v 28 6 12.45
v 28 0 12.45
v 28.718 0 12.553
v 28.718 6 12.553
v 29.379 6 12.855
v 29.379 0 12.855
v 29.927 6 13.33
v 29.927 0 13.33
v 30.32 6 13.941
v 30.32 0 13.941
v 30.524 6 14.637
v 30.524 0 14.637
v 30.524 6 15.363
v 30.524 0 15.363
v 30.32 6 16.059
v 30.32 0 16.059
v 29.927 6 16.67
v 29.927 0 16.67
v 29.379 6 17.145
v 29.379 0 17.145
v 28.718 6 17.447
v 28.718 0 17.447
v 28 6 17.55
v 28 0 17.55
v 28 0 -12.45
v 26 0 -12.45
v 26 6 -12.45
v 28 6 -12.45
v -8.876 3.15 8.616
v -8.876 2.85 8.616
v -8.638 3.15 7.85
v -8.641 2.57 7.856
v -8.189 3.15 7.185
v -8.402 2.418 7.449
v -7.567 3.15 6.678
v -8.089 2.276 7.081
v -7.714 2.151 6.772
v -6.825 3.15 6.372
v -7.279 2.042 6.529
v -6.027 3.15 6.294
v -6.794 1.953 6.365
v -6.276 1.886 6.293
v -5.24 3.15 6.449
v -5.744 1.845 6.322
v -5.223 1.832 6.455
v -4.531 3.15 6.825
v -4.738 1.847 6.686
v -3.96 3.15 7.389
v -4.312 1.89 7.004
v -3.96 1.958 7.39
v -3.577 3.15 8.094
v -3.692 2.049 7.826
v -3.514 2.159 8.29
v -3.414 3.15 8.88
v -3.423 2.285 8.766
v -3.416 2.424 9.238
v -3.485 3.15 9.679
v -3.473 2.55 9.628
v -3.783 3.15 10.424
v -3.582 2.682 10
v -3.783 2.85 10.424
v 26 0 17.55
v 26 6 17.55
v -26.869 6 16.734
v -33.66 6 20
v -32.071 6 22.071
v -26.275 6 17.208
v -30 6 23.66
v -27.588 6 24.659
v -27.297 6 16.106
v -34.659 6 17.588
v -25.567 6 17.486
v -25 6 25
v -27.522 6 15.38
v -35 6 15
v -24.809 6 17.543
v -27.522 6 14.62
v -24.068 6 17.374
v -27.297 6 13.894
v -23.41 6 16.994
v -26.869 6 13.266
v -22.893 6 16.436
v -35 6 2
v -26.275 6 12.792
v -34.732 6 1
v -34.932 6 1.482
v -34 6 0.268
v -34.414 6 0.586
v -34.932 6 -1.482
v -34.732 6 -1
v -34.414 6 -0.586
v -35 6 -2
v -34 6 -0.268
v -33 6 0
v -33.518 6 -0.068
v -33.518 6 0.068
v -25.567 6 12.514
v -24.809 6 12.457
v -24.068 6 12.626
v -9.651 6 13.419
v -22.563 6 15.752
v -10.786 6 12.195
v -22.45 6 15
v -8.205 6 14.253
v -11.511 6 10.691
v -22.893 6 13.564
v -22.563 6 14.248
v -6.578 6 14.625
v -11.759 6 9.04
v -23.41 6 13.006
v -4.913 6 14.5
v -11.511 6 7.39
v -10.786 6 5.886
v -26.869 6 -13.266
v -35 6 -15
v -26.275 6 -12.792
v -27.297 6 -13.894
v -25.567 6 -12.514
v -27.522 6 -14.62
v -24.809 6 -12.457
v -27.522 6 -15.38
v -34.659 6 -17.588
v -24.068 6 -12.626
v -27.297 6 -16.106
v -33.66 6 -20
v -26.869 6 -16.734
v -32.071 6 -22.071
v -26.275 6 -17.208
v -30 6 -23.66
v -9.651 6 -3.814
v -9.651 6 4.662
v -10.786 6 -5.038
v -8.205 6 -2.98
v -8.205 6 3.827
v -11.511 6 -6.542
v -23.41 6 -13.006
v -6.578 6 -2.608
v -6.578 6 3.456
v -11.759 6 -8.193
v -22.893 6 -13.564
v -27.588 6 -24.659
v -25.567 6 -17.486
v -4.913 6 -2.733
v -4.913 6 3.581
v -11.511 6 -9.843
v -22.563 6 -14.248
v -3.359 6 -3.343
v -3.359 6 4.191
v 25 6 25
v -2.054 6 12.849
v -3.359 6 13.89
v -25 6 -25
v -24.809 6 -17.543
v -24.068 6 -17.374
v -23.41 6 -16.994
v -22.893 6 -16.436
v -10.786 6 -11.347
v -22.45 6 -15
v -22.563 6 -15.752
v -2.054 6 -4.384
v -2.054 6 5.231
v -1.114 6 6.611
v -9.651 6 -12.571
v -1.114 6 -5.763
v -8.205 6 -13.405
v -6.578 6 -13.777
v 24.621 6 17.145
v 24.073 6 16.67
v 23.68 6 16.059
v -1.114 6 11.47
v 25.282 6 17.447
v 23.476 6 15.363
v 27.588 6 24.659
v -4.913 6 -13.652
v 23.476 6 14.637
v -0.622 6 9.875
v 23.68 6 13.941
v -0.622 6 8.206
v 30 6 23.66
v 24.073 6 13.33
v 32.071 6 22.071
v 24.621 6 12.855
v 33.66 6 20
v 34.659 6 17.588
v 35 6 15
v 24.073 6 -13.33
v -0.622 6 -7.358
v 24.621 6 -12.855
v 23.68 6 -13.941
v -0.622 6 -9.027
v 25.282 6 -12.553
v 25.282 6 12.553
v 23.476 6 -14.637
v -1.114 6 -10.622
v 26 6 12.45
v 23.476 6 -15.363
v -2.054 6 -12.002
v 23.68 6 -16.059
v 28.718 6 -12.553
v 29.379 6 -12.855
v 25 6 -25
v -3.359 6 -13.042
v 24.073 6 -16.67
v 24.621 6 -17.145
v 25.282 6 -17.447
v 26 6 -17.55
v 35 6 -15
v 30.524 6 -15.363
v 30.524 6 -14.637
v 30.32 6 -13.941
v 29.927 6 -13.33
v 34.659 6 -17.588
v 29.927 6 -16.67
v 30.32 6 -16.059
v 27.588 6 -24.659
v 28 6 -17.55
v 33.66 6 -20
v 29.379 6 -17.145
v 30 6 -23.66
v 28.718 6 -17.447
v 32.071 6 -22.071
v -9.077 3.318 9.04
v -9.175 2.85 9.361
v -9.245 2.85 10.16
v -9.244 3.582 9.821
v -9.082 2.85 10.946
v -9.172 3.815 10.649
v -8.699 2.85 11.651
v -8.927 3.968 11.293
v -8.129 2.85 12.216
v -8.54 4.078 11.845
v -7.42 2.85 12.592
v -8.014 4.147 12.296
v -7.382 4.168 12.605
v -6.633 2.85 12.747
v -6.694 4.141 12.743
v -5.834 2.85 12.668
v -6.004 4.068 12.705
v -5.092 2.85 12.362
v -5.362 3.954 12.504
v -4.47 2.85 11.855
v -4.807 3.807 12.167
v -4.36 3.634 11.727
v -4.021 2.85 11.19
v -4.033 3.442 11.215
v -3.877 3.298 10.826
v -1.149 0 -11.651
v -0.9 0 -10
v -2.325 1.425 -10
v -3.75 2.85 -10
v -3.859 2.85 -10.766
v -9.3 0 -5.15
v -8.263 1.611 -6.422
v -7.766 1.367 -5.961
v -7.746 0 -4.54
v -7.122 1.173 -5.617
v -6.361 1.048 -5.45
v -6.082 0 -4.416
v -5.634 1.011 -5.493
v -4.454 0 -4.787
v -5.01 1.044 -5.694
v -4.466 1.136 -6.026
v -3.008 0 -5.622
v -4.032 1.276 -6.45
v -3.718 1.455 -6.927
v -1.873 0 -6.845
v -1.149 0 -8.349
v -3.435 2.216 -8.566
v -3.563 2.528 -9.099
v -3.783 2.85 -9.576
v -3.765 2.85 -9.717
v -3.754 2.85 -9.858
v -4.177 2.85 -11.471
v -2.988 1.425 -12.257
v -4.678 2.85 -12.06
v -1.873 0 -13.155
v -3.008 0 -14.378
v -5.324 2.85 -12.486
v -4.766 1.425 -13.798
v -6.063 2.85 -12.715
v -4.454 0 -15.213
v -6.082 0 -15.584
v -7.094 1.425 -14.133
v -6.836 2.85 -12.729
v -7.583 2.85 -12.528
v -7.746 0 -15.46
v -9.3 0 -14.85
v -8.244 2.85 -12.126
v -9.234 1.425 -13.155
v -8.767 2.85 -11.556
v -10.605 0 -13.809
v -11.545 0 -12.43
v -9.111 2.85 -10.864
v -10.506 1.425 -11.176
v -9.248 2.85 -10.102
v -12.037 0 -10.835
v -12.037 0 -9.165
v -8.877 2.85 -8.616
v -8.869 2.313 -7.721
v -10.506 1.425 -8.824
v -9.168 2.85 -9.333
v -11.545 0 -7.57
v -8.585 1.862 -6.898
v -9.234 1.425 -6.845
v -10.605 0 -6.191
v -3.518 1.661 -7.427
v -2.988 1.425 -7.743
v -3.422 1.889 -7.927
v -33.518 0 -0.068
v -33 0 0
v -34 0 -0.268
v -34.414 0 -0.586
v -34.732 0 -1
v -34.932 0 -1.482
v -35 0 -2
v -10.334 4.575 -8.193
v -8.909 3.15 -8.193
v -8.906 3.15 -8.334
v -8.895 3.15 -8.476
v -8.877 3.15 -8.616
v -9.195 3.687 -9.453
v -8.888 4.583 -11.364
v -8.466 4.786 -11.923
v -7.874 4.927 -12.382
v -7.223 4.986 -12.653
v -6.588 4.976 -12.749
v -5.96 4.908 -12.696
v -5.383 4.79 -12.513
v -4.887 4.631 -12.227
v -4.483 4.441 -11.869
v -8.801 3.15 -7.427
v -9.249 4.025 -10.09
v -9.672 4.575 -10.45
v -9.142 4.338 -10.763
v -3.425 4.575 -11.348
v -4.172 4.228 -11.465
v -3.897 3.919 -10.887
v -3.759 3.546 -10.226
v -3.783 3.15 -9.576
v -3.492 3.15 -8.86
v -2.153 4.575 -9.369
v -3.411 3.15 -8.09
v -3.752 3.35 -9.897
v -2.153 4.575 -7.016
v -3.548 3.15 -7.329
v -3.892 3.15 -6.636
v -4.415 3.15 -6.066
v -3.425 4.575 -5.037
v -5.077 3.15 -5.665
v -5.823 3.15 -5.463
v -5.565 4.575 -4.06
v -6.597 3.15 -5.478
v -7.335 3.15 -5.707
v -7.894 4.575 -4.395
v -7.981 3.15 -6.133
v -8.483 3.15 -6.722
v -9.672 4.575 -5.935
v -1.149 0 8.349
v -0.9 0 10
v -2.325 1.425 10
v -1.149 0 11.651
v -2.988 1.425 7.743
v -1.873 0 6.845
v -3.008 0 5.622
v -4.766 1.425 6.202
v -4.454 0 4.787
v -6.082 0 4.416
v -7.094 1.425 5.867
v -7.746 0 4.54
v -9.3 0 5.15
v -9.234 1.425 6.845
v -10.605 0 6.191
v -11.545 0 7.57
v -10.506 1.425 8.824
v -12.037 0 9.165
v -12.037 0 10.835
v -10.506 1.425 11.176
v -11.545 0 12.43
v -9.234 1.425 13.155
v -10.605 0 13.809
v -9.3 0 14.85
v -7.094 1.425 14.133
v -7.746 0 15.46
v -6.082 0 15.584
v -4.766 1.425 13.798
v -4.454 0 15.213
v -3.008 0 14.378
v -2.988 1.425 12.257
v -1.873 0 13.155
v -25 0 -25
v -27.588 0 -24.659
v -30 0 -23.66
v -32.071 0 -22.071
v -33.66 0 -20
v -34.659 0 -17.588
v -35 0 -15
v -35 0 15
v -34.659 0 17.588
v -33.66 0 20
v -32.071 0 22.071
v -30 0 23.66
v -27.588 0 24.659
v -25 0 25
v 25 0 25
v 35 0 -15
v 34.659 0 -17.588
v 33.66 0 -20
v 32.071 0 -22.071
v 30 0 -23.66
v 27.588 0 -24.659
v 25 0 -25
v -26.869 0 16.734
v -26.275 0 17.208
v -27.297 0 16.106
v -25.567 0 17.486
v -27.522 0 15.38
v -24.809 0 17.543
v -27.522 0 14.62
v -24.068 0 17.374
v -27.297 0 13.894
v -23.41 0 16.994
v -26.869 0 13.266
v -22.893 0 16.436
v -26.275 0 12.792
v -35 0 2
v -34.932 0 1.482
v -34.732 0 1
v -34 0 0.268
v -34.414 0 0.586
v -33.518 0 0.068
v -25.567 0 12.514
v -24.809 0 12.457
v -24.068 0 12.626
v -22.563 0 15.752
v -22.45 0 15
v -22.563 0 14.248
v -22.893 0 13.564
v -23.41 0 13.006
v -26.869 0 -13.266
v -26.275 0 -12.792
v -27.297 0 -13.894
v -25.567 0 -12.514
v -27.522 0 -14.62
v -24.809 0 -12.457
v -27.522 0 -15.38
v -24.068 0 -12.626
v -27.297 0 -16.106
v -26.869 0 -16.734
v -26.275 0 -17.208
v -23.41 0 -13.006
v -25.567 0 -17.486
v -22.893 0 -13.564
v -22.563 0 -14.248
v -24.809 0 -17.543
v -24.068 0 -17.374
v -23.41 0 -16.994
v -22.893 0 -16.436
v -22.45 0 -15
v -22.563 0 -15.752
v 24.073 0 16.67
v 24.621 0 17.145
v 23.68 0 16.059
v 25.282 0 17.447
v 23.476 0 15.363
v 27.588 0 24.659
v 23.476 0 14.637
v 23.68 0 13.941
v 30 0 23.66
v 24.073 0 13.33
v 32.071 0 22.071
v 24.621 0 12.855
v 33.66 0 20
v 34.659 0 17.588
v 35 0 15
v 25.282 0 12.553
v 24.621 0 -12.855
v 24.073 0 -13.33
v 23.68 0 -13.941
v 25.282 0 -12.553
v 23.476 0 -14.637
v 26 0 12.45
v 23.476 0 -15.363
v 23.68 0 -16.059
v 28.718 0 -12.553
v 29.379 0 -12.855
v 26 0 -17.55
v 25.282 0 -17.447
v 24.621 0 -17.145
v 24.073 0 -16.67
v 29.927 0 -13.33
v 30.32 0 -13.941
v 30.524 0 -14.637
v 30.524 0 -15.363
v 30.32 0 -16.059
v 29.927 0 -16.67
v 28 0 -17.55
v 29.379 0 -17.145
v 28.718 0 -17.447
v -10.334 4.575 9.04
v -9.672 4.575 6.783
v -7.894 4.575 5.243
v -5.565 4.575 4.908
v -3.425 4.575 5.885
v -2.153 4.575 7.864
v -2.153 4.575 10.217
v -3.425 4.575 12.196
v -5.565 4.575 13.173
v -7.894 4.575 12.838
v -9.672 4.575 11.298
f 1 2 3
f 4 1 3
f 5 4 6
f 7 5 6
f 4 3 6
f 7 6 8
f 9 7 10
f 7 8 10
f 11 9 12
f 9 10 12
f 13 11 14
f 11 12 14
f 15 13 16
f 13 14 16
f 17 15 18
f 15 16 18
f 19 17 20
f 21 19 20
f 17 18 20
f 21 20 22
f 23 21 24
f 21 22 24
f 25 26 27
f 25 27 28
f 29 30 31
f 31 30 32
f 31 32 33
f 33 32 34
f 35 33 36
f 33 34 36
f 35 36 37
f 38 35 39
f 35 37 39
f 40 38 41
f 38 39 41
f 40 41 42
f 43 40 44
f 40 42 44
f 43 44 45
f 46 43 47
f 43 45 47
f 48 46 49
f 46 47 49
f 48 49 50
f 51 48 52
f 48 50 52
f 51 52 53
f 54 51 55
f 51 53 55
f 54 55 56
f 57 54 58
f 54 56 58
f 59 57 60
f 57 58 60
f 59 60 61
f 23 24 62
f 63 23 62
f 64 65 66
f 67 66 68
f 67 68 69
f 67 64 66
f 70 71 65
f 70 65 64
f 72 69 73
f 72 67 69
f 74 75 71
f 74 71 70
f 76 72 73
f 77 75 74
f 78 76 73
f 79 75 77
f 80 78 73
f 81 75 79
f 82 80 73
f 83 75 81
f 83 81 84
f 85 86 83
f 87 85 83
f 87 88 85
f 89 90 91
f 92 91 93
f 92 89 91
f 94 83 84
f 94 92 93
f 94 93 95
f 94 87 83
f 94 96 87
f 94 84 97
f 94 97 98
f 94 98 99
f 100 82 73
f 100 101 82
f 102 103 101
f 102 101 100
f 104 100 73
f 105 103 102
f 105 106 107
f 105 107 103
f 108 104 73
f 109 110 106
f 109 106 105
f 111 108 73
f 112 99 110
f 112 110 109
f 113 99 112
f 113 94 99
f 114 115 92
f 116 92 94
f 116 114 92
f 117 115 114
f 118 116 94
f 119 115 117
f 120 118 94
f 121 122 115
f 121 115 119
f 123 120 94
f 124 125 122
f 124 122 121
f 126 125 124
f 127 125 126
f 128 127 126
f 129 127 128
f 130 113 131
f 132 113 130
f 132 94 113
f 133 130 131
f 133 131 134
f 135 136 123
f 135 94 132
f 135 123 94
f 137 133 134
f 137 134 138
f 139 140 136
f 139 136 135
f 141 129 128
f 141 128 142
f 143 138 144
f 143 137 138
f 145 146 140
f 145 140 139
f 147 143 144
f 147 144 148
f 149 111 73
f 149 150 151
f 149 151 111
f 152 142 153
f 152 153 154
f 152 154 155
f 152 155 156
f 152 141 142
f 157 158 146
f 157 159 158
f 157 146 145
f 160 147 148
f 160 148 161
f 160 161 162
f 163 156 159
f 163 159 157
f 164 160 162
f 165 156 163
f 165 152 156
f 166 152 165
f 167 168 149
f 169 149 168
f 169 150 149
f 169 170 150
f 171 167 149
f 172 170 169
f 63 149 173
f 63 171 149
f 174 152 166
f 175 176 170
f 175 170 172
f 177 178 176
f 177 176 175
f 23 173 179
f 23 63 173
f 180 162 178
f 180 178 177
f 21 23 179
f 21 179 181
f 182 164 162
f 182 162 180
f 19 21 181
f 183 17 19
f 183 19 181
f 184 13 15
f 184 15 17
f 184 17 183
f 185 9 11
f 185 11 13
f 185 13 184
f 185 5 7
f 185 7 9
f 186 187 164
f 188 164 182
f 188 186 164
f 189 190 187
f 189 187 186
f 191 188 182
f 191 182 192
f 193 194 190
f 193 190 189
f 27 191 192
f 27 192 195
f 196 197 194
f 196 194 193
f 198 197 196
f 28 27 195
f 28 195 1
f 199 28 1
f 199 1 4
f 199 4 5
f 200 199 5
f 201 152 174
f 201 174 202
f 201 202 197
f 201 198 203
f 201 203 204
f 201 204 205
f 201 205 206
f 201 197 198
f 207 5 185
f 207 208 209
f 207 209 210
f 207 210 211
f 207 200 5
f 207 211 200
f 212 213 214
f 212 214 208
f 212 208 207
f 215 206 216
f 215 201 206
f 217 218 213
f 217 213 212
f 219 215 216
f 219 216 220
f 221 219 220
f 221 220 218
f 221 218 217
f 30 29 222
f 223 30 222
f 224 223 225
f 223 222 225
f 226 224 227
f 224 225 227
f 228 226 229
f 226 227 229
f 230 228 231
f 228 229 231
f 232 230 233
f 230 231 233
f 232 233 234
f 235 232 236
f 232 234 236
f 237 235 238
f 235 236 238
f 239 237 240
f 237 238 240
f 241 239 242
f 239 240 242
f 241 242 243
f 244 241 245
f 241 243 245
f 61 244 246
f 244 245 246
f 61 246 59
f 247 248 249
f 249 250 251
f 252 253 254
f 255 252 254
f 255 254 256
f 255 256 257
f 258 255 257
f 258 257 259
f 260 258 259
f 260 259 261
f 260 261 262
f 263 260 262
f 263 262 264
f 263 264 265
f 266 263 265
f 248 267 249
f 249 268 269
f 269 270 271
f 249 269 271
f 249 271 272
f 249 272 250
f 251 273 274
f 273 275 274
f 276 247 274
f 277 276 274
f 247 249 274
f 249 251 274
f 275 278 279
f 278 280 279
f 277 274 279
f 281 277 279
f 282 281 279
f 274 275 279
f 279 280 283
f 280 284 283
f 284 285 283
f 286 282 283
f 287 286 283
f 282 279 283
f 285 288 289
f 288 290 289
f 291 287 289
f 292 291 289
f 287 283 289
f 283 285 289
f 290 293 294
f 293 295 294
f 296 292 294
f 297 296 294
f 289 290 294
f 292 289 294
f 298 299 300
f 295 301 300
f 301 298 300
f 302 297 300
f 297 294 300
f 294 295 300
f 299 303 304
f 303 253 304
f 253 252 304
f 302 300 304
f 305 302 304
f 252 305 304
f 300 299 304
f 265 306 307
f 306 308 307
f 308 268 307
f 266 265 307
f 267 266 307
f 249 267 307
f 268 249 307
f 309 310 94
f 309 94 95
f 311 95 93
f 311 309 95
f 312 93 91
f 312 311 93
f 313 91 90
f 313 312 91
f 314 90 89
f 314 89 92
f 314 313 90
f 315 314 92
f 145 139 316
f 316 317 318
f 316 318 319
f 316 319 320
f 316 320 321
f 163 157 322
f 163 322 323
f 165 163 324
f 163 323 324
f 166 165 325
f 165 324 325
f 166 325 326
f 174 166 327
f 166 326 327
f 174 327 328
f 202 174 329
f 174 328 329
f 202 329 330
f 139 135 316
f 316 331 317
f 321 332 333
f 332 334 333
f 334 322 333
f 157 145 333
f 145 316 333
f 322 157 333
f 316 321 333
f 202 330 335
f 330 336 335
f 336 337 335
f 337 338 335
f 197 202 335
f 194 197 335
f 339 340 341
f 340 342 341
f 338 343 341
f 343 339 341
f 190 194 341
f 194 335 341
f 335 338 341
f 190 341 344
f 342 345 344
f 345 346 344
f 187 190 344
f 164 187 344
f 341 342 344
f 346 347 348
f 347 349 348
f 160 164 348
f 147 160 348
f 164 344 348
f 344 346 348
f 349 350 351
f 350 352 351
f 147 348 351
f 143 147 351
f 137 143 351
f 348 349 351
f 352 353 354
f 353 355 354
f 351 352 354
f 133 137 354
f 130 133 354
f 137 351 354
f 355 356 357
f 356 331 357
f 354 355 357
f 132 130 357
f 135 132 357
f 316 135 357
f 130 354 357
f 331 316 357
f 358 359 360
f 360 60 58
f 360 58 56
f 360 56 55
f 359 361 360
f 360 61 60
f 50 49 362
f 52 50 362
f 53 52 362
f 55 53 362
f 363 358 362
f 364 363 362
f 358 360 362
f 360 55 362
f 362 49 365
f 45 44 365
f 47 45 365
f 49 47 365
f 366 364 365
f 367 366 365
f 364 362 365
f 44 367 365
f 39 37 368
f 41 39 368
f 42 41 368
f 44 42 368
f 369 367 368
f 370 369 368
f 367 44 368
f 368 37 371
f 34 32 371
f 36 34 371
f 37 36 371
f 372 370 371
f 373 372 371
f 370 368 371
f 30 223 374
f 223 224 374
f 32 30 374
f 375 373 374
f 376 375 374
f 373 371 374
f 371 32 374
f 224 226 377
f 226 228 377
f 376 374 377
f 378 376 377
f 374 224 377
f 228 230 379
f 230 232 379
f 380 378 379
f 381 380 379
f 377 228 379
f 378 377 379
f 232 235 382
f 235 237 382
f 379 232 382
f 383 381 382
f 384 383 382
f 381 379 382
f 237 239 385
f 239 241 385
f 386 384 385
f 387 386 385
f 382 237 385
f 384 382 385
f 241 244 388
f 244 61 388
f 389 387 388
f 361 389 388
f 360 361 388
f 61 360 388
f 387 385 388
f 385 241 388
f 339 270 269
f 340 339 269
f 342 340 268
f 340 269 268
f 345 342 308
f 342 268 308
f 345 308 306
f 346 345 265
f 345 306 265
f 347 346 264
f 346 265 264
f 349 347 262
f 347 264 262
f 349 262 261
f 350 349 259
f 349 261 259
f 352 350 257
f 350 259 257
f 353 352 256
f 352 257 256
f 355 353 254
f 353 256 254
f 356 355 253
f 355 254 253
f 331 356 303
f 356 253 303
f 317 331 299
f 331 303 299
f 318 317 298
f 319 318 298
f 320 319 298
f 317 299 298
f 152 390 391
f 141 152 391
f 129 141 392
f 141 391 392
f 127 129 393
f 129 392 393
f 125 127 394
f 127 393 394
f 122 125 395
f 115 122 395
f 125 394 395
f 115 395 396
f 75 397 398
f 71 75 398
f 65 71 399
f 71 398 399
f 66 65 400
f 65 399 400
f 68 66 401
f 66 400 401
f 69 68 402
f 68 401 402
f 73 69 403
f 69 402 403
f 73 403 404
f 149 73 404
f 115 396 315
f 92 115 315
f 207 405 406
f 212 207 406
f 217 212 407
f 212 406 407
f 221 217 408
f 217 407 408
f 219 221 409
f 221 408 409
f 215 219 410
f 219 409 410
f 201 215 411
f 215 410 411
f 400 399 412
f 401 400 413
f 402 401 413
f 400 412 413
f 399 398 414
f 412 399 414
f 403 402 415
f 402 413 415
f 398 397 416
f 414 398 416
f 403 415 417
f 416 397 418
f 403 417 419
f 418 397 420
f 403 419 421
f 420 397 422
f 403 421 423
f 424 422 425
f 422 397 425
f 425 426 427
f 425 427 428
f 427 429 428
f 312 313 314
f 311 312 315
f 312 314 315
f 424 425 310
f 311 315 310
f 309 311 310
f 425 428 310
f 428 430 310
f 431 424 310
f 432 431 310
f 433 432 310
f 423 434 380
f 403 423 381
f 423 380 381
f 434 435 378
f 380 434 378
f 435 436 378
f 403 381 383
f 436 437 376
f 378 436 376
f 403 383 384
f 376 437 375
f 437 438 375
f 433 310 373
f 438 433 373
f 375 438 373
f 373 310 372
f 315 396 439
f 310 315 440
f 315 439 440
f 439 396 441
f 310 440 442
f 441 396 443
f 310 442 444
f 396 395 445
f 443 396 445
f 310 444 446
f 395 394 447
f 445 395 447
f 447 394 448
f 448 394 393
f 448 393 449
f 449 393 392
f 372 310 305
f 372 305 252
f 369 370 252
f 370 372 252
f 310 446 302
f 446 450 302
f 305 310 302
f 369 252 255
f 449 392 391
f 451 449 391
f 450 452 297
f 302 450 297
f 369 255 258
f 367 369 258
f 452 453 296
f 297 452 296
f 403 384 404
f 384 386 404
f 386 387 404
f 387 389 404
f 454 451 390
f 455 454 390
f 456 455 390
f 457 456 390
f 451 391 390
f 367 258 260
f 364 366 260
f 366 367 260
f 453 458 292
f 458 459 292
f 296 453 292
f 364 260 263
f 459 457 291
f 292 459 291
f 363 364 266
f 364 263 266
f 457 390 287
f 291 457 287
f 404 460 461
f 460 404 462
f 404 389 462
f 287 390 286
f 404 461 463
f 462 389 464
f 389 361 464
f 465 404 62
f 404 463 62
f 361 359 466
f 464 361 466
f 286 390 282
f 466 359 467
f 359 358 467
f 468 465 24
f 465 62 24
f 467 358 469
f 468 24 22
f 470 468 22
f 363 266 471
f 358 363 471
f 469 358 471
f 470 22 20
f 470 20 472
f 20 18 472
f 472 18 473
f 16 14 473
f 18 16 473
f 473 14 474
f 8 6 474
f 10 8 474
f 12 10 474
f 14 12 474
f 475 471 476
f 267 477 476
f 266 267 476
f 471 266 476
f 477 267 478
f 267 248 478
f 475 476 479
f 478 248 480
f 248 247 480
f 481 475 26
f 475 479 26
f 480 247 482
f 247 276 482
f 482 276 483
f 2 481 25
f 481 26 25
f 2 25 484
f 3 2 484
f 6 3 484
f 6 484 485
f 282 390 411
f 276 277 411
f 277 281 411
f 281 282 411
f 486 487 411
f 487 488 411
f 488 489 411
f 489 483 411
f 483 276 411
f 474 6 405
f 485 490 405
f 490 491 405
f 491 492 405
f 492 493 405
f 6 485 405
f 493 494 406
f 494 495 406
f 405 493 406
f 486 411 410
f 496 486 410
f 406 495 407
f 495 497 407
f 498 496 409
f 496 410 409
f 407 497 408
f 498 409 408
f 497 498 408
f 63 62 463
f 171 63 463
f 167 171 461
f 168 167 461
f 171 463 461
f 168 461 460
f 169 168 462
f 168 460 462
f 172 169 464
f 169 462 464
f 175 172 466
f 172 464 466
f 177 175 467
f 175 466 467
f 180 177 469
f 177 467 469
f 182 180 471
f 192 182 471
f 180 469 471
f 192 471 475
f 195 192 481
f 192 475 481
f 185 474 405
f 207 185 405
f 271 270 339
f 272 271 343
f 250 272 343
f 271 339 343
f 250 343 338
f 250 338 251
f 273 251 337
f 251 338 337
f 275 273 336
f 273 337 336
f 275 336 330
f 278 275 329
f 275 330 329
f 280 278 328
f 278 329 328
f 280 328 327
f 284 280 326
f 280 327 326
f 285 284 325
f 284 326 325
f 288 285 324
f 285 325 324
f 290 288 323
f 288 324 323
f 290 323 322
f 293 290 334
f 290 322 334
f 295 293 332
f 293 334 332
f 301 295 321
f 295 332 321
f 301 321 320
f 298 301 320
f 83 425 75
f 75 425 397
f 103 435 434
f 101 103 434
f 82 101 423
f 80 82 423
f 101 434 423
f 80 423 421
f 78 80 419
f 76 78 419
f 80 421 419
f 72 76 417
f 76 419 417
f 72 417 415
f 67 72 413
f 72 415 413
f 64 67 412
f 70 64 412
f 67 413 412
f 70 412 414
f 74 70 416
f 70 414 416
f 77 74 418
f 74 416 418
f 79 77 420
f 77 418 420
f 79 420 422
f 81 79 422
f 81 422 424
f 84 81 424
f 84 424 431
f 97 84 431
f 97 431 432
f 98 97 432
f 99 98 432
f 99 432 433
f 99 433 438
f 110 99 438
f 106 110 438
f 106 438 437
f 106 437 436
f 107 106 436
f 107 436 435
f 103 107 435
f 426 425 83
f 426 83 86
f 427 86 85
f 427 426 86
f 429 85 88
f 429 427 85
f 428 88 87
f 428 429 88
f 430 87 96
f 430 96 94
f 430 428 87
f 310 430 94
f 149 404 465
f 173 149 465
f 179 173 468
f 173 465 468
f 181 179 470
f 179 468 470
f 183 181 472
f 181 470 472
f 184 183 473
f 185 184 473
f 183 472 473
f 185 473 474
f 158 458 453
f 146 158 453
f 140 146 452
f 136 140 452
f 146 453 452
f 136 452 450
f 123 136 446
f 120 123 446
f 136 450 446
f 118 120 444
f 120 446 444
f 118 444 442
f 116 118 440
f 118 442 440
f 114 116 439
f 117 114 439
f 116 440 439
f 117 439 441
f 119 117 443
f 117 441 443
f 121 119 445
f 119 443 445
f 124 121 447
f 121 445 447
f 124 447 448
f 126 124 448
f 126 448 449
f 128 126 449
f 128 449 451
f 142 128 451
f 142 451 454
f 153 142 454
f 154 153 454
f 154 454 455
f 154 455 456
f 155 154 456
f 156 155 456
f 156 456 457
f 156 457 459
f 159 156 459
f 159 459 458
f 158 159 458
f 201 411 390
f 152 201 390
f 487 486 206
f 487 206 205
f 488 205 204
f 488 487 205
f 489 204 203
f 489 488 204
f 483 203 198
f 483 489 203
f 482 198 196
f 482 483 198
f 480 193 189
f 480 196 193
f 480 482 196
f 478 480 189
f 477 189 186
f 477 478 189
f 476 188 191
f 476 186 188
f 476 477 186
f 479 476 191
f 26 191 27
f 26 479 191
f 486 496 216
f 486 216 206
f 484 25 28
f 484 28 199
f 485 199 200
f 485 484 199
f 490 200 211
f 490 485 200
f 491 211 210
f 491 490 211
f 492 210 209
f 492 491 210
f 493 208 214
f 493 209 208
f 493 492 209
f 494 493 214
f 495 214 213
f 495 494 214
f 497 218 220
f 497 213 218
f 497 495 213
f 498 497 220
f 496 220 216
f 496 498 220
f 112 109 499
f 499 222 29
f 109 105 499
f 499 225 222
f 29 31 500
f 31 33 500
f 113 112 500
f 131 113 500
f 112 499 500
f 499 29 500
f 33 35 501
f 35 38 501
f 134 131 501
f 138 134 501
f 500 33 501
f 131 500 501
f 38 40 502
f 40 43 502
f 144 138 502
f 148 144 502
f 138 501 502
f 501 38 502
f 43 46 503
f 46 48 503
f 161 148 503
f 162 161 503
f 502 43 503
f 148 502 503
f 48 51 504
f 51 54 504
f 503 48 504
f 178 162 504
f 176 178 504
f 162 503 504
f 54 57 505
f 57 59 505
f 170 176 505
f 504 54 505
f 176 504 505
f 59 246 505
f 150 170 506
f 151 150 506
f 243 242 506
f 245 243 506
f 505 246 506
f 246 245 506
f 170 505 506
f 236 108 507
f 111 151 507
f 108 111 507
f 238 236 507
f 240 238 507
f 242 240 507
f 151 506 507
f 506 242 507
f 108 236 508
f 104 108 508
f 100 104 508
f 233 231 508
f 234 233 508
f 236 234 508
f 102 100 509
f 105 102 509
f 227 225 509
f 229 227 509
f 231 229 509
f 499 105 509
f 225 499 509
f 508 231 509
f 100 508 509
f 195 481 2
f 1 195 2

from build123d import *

# Parameters (mm, degrees)
EXTRUDE_1_DEPTH             = 6
SKETCH_2_R                  = 2.55
CUT_EXTRUDE_1_DEPTH         = 7
CUT_EXTRUDE_2_DEPTH         = 7
HOLE_WIZARD_M52_D           = 5.5
HOLE_WIZARD_M52_CSINK_D     = 11.2
HOLE_WIZARD_M52_CSINK_ANGLE = 90
HOLE_WIZARD_M51_D           = 5.5
HOLE_WIZARD_M51_CSINK_D     = 11.2
HOLE_WIZARD_M51_CSINK_ANGLE = 90


with BuildPart() as part:
    # Эскиз1 → Бобышка-Вытянуть1 (new body)
    with BuildSketch(Plane(origin=(0, 0, 0), x_dir=(1, 0, 0), z_dir=(0, 1, 0))):
        with BuildLine():
            Line((-25, -25), (25, -25))
            ThreePointArc((25, -25), (32.071067812, -22.071067812), (35, -15))
            Line((35, -15), (35, 15))
            ThreePointArc((35, 15), (32.071067812, 22.071067812), (25, 25))
            Line((25, 25), (-25, 25))
            ThreePointArc((-25, 25), (-32.071067812, 22.071067812), (-35, 15))
            Line((-35, 15), (-35, -15))
            ThreePointArc((-35, -15), (-32.071067812, -22.071067812), (-25, -25))
        make_face()
    extrude(amount=EXTRUDE_1_DEPTH)

    # Эскиз2 → Вырез-Вытянуть1 (cut, through all)
    with BuildSketch(Plane.XZ):
        with Locations((-25, -15)):
            Circle(SKETCH_2_R)
        with Locations((-25, 15)):
            Circle(SKETCH_2_R)
        with BuildLine():
            Line((28, -17.55), (26, -17.55))
            ThreePointArc((26, -17.55), (23.45, -15), (26, -12.45))
            Line((26, -12.45), (28, -12.45))
            ThreePointArc((28, -12.45), (30.55, -15), (28, -17.55))
        make_face()
        with BuildLine():
            Line((28, 17.55), (26, 17.55))
            ThreePointArc((26, 17.55), (23.45, 15), (26, 12.45))
            Line((26, 12.45), (28, 12.45))
            ThreePointArc((28, 12.45), (30.55, 15), (28, 17.55))
        make_face()
    extrude(amount=-CUT_EXTRUDE_1_DEPTH, mode=Mode.SUBTRACT)

    # Эскиз3 → Вырез-Вытянуть2 (cut, through all)
    with BuildSketch(Plane.XZ):
        with BuildLine():
            Line((-35, -2), (-35, 2))
            ThreePointArc((-35, 2), (-34.414213562, 0.585786438), (-33, 0))
            ThreePointArc((-33, 0), (-34.414213562, -0.585786438), (-35, -2))
        make_face()
    extrude(amount=-CUT_EXTRUDE_2_DEPTH, mode=Mode.SUBTRACT)

    # Зенковка для  винта с потайной головкой с внутренним шестигранником M52 (through all)
    with Locations(Plane(origin=(0, 6, 0), x_dir=(1, 0, 0), z_dir=(0, 1, 0))):
        with Locations((-6.159381211, -9.040339254), (-6.159381211, 8.192585184)):
            CounterSinkHole(HOLE_WIZARD_M52_D / 2, HOLE_WIZARD_M52_CSINK_D / 2, counter_sink_angle=HOLE_WIZARD_M52_CSINK_ANGLE)

    # Зенковка для  винта с потайной головкой с внутренним шестигранником M51 (through all)
    with Locations(Plane(origin=(0, 0, 0), x_dir=(-1, 0, 0), z_dir=(0, -1, 0))):
        with Locations((6.5, -10), (6.5, 10)):
            CounterSinkHole(HOLE_WIZARD_M51_D / 2, HOLE_WIZARD_M51_CSINK_D / 2, counter_sink_angle=HOLE_WIZARD_M51_CSINK_ANGLE)


solid = part.part
